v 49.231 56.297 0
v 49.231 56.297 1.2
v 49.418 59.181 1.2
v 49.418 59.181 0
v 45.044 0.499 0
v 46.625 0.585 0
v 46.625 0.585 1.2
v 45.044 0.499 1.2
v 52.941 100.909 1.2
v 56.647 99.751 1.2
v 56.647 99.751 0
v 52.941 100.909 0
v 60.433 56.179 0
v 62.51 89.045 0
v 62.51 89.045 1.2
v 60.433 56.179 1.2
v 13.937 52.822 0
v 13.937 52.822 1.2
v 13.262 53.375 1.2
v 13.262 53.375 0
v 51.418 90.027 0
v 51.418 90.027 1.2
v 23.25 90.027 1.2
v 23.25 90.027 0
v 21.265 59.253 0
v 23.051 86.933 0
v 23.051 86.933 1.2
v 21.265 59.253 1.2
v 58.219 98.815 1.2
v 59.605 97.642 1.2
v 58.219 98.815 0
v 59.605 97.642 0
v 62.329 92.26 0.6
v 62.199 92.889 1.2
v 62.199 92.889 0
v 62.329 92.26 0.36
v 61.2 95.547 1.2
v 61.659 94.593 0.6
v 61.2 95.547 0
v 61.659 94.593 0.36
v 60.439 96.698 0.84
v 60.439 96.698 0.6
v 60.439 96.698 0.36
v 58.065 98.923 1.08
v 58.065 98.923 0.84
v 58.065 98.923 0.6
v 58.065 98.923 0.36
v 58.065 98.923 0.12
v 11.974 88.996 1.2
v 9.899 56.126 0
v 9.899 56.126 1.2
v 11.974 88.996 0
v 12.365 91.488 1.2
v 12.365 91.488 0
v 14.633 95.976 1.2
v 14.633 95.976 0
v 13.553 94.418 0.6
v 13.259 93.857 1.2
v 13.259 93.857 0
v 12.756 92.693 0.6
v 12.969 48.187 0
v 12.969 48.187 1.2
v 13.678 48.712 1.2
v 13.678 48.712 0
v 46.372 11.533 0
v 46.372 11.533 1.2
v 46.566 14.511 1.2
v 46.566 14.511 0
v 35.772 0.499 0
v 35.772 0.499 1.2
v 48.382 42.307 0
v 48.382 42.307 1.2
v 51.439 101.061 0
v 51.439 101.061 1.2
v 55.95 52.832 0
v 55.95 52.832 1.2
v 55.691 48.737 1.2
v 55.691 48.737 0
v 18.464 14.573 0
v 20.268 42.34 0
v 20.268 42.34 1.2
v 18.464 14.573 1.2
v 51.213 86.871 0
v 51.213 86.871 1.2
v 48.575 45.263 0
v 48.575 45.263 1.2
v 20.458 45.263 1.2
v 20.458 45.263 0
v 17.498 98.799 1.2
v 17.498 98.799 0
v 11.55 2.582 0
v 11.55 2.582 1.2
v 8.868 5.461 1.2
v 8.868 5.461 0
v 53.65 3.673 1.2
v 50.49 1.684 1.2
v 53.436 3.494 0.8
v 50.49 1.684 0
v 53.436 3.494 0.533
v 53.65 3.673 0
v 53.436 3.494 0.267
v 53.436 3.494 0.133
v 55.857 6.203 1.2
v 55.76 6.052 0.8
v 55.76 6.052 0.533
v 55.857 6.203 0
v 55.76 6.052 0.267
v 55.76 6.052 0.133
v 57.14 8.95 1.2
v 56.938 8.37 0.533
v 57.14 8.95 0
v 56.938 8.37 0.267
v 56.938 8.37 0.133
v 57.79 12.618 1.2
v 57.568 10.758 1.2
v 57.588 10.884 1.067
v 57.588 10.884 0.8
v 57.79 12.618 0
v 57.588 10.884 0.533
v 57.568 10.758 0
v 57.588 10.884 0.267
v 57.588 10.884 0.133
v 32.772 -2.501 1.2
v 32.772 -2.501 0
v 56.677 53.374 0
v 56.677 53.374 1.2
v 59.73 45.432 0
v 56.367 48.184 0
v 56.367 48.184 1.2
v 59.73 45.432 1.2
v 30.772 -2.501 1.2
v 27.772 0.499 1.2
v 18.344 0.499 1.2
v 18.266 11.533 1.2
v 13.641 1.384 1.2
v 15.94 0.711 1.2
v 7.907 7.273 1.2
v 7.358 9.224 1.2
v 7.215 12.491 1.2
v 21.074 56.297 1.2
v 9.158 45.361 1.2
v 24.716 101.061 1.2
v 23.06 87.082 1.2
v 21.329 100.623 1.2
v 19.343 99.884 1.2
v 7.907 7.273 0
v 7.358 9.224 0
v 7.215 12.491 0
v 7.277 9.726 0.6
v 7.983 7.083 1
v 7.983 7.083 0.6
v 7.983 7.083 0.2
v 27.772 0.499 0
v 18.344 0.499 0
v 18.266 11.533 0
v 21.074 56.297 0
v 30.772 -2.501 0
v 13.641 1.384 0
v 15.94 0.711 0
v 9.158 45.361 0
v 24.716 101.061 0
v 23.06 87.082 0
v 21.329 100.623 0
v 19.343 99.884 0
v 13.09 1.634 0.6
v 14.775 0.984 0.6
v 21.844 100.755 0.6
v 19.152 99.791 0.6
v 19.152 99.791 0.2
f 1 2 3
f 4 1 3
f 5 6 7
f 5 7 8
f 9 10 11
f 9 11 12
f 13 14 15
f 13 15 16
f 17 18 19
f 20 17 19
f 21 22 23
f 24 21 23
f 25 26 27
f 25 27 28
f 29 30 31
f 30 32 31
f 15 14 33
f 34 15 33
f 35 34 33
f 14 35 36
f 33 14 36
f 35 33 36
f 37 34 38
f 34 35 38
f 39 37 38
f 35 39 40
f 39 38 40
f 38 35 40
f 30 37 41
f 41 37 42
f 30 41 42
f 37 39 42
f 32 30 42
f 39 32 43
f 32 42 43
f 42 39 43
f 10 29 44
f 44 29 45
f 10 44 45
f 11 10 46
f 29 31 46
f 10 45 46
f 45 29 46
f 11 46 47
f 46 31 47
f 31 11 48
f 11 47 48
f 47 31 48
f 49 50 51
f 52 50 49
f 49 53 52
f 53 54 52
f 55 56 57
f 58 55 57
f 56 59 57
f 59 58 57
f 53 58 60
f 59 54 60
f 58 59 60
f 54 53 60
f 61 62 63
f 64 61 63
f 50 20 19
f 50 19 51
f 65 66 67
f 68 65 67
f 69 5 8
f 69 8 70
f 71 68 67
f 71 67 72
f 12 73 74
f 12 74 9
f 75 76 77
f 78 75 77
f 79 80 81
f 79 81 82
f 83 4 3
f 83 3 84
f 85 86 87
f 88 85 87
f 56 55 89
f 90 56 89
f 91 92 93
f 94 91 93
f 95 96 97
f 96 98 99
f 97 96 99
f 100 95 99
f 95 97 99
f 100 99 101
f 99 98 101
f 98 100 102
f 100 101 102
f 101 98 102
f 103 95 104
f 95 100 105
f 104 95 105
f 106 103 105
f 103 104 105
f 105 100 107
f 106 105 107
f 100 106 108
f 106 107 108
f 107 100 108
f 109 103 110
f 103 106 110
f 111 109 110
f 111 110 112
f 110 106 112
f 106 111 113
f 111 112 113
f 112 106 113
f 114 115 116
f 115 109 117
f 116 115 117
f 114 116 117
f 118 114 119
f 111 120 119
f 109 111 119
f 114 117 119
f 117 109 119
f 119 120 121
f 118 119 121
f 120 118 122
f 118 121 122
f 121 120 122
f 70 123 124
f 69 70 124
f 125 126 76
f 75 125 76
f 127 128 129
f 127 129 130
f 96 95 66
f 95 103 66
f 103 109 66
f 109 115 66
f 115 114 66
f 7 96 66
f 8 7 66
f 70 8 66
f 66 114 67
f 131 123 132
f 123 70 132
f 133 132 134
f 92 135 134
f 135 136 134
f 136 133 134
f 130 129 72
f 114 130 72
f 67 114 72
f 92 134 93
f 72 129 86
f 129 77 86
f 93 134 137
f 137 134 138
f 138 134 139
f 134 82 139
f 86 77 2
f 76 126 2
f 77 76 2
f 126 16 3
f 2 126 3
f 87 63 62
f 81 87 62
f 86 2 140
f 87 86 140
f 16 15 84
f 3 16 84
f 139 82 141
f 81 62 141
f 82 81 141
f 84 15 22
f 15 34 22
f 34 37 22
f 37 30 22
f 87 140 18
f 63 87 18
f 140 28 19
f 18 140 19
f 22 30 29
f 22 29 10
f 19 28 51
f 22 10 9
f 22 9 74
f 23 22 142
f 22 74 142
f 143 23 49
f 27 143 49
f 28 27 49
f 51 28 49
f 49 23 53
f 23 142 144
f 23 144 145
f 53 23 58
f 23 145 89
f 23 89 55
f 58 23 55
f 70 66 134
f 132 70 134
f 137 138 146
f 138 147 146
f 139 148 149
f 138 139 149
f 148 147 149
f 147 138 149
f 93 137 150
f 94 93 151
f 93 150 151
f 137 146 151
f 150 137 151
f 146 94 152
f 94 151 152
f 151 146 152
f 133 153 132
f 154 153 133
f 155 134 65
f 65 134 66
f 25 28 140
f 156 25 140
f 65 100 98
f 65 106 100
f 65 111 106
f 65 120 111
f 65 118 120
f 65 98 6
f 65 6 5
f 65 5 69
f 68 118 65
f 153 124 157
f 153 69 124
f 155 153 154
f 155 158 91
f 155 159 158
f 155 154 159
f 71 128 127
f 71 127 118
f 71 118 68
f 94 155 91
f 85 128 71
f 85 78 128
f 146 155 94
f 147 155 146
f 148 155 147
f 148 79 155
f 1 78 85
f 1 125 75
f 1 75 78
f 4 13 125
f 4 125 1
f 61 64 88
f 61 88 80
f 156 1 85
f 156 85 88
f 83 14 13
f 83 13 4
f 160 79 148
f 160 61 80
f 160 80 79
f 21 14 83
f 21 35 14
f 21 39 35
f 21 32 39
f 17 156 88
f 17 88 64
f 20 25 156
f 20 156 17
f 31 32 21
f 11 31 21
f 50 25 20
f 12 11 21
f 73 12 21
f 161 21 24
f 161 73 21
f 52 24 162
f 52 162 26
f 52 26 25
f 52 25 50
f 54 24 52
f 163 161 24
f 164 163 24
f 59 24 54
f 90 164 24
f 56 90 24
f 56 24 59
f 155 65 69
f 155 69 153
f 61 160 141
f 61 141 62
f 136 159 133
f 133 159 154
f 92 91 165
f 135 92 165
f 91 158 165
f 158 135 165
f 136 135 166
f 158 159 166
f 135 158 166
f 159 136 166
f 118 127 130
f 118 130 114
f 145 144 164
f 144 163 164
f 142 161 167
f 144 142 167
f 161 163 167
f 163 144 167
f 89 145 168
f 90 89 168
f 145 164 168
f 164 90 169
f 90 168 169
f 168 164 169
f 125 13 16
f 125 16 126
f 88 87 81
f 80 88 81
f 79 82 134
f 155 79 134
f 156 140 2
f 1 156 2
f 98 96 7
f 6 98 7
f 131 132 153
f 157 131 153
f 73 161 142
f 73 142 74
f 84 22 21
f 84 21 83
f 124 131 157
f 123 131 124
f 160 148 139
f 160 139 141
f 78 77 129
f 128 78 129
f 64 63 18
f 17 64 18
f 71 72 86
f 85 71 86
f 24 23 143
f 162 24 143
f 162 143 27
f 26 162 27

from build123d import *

# Parameters (mm, degrees)
EXTRUDE_1_DEPTH     = 1.2
EXTRUDE_1_2_DEPTH   = 1.2
EXTRUDE_1_3_DEPTH   = 1.2
EXTRUDE_1_4_DEPTH   = 1.2
EXTRUDE_1_5_DEPTH   = 1.2
EXTRUDE_1_6_DEPTH   = 1.2
EXTRUDE_1_7_DEPTH   = 1.2
CUT_EXTRUDE_START   = -1.2
CUT_EXTRUDE_1_DEPTH = 1.2
EXTRUDE_2_DEPTH     = 1.2
SKETCH_4_W          = 8
SKETCH_4_H          = 3
EXTRUDE_3_DEPTH     = 1.2
CHAMFER_1_SIZE      = 3


# Read off the part's stored shape, not the designer's step: Вырез-Вытянуть-Тонкостенный1
with BuildPart() as part:
    # Эскиз1 → Бобышка-Вытянуть1 (new body)
    with BuildSketch(Plane.XY):
        with BuildLine():
            Line((48.715381083, 89.326618208), (25.633974438, 89.326618208))
            Line((25.633974438, 89.326618208), (16.424726332, 98.90501339))
            add(Edge.make_bspline(
                [(16.424726332, 98.90501339), (17.046442876, 99.341649928), (18.267344562, 100.199099019), (20.315095034, 101.097084096), (22.468240975, 101.668181371), (23.953020919, 101.729925319), (24.701392351, 101.76104603)],
                knots=[0, 0, 0, 0, 1.020658978, 2.004328627, 2.994124718, 4, 4, 4, 4], degree=3))
            Line((24.701392351, 101.76104603), (51.474269756, 101.76104603))
            Line((51.474269756, 101.76104603), (53.96115532, 101.508471715))
            Line((53.96115532, 101.508471715), (48.715381083, 89.326618208))
        make_face()
    extrude(amount=EXTRUDE_1_DEPTH)


with BuildPart() as body_2:
    # Эскиз1 → Extrude 1 2 (new body)
    with BuildSketch(Plane.XY):
        with BuildLine():
            Line((50.522258876, 87.034020578), (56.292610537, 100.711891183))
            add(Edge.make_bspline(
                [(56.292610537, 100.711891183), (56.872426459, 100.424489235), (57.992774107, 99.869157649), (59.468715814, 98.779028645), (60.7115741, 97.54513856), (61.719561272, 96.151707655), (62.467267736, 94.583389711), (62.961857151, 92.863872855), (63.249109501, 90.9875998), (63.222892422, 89.690287211), (63.209261013, 89.015757512)],
                knots=[0, 0, 0, 0, 1.065948377, 2.059675685, 3.011626956, 3.94566096, 4.882319089, 5.862745984, 6.888747923, 8, 8, 8, 8], degree=3))
            Line((63.209261013, 89.015757512), (61.110951318, 55.811949469))
            Line((61.110951318, 55.811949469), (56.661757613, 52.489625785))
            Line((56.661757613, 52.489625785), (48.695952289, 58.862270044))
            Line((48.695952289, 58.862270044), (50.522258876, 87.034020578))
        make_face()
    extrude(amount=EXTRUDE_1_2_DEPTH)


with BuildPart() as body_3:
    # Эскиз1 → Extrude 1 3 (new body)
    with BuildSketch(Plane.XY):
        with BuildLine():
            Line((47.705083822, 42.678085082), (56.389754504, 49.070158134))
            Line((56.389754504, 49.070158134), (60.45037234, 45.74783445))
            Line((60.45037234, 45.74783445), (58.488064199, 12.5634552))
            add(Edge.make_bspline(
                [(58.488064199, 12.5634552), (58.420496696, 11.874587816), (58.28970777, 10.541162419), (57.823949094, 8.625296868), (57.098173468, 6.888651889), (56.155918884, 5.305629758), (54.972806214, 3.892910011), (53.56092009, 2.640506095), (51.90764089, 1.560277715), (50.685929609, 1.000522637), (50.055967832, 0.711891183)],
                knots=[0, 0, 0, 0, 1.076355317, 2.083477241, 3.054916997, 3.995219207, 4.939832775, 5.910749548, 6.922701339, 8, 8, 8, 8], degree=3))
            Line((50.055967832, 0.711891183), (45.859348442, 14.428619374))
            Line((45.859348442, 14.428619374), (47.705083822, 42.678085082))
        make_face()
    extrude(amount=EXTRUDE_1_3_DEPTH)


with BuildPart() as body_4:
    # Эскиз1 → Extrude 1 4 (new body)
    with BuildSketch(Plane.XY):
        with BuildLine():
            Line((20.815633657, 12.233165711), (43.877611508, 12.233165711))
            Line((43.877611508, 12.233165711), (47.549653474, -0.065260556))
            Line((47.549653474, -0.065260556), (45.06276791, -0.201262111))
            Line((45.06276791, -0.201262111), (18.328748093, -0.201262111))
            add(Edge.make_bspline(
                [(18.328748093, -0.201262111), (17.587342725, -0.16790088), (16.138327284, -0.102699115), (14.051390965, 0.415320239), (12.125296995, 1.268374835), (11.016129357, 2.10124066), (10.460086737, 2.518768975)],
                knots=[0, 0, 0, 0, 1.046522757, 2.045342129, 3.020100256, 4, 4, 4, 4], degree=3))
            Line((10.460086737, 2.518768975), (20.815633657, 12.233165711))
        make_face()
    extrude(amount=EXTRUDE_1_4_DEPTH)


with BuildPart() as body_5:
    # Эскиз1 → Extrude 1 5 (new body)
    with BuildSketch(Plane.XY):
        with BuildLine():
            Line((19.144757418, 14.253760232), (8.750352911, 4.383933149))
            add(Edge.make_bspline(
                [(8.750352911, 4.383933149), (8.347830199, 4.971791124), (7.548998065, 6.138432973), (6.823323675, 8.155816029), (6.434028016, 10.301026142), (6.488276416, 11.771820349), (6.516041662, 12.524597613)],
                knots=[0, 0, 0, 0, 0.987067533, 1.958898816, 2.955330013, 4, 4, 4, 4], degree=3))
            Line((6.516041662, 12.524597613), (8.478349802, 45.728405657))
            Line((8.478349802, 45.728405657), (12.985829888, 49.070158134))
            Line((12.985829888, 49.070158134), (20.990492798, 42.658656288))
            Line((20.990492798, 42.658656288), (19.144757418, 14.253760232))
        make_face()
    extrude(amount=EXTRUDE_1_5_DEPTH)


with BuildPart() as body_6:
    # Эскиз1 → Extrude 1 6 (new body)
    with BuildSketch(Plane.XY):
        with BuildLine():
            Line((21.942503678, 58.881698837), (13.238404203, 52.489625785))
            Line((13.238404203, 52.489625785), (9.177786367, 55.811949469))
            Line((9.177786367, 55.811949469), (11.276096062, 89.054615099))
            add(Edge.make_bspline(
                [(11.276096062, 89.054615099), (11.352568907, 89.792004626), (11.503633208, 91.248642381), (12.205959169, 93.332866685), (13.177672166, 95.318642991), (14.120219983, 96.460520121), (14.598419746, 97.039849216)],
                knots=[0, 0, 0, 0, 1.007070456, 1.989364909, 2.979908279, 4, 4, 4, 4], degree=3))
            Line((14.598419746, 97.039849216), (23.768810265, 87.189450926))
            Line((23.768810265, 87.189450926), (21.942503678, 58.881698837))
        make_face()
    extrude(amount=EXTRUDE_1_6_DEPTH)


with BuildPart() as body_7:
    # Эскиз1 → Extrude 1 7 (new body)
    with BuildSketch(Plane.XY):
        Polygon((14.948138029, 50.77989196), (23.613379917, 56.997105871), (46.811359323, 56.997105871), (54.680020679, 50.77989196), (46.034207584, 44.562678049), (22.816799385, 44.562678049), align=None)
    extrude(amount=EXTRUDE_1_7_DEPTH)


with BuildPart() as cut_extrude_1_tool:
    # Вырез-Вытянуть-Тонкостенный1 outline → Вырез-Вытянуть-Тонкостенный1 (new body)
    # profile 1 of 7: a face of its own
    with BuildSketch(Plane.XY.offset(1.2).offset(CUT_EXTRUDE_START)):
        with BuildLine():
            add(Edge.make_bspline(
                [(16.424726332, 98.90501339), (17.046442876, 99.341649928), (18.267344562, 100.199099019), (20.315095034, 101.097084096), (22.468240975, 101.668181371), (23.953020919, 101.729925319), (24.701392351, 101.76104603)],
                knots=[0, 0, 0, 0, 0.255164744, 0.501082157, 0.74853118, 1, 1, 1, 1], degree=3))
            Line((16.424726332, 98.90501339), (25.633974438, 89.326618208))
            Line((25.633974438, 89.326618208), (48.715381083, 89.326618208))
            Line((48.715381083, 89.326618208), (53.96115532, 101.508471715))
            Line((53.96115532, 101.508471715), (51.474269756, 101.76104603))
            Line((51.474269756, 101.76104603), (24.701392351, 101.76104603))
        make_face()
        with BuildLine():
            add(Edge.make_bspline(
                [(24.715941202, 101.06104603), (24.073440985, 101.034324979), (23.430886148, 101.008238304), (22.474393504, 100.88386239), (22.156175981, 100.826220075), (21.532137699, 100.683185135), (21.225013046, 100.59813608), (20.315786313, 100.309405985), (19.724576172, 100.075612456), (18.865147168, 99.649208655), (18.582909623, 99.492741509), (18.032739645, 99.157865771), (17.763926458, 98.980519597), (17.497832435, 98.79887764)],
                knots=[0, 0, 0, 0, 0.25, 0.25, 0.375, 0.375, 0.5, 0.5, 0.75, 0.75, 0.875, 0.875, 1, 1, 1, 1], degree=3))
            Line((24.715941202, 101.06104603), (51.438814077, 101.06104603))
            Line((51.438814077, 101.06104603), (52.940656917, 100.908515117))
            Line((52.940656917, 100.908515117), (48.254672603, 90.026618208))
            Line((48.254672603, 90.026618208), (25.932012903, 90.026618208))
            Line((25.932012903, 90.026618208), (17.497832435, 98.79887764))
        make_face(mode=Mode.SUBTRACT)
    # profile 2 of 7: a face of its own
    with BuildSketch(Plane.XY.offset(1.2).offset(CUT_EXTRUDE_START)):
        with BuildLine():
            add(Edge.make_bspline(
                [(58.488064199, 12.5634552), (58.420496696, 11.874587816), (58.28970777, 10.541162419), (57.823949094, 8.625296868), (57.098173468, 6.888651889), (56.155918884, 5.305629758), (54.972806214, 3.892910011), (53.56092009, 2.640506095), (51.90764089, 1.560277715), (50.685929609, 1.000522637), (50.055967832, 0.711891183)],
                knots=[0, 0, 0, 0, 0.134544415, 0.260434655, 0.381864625, 0.499402401, 0.617479097, 0.738843694, 0.865337667, 1, 1, 1, 1], degree=3))
            Line((58.488064199, 12.5634552), (60.45037234, 45.74783445))
            Line((60.45037234, 45.74783445), (56.389754504, 49.070158134))
            Line((56.389754504, 49.070158134), (47.705083822, 42.678085082))
            Line((47.705083822, 42.678085082), (45.859348442, 14.428619374))
            Line((45.859348442, 14.428619374), (50.055967832, 0.711891183))
        make_face()
        with BuildLine():
            add(Edge.make_bspline(
                [(50.490477038, 1.684339901), (51.016803061, 1.932934245), (51.533598279, 2.195809917), (52.51798996, 2.795282573), (52.988546029, 3.127444771), (53.883987055, 3.860204526), (54.311901532, 4.26460134), (55.090762842, 5.120051505), (55.44412253, 5.572957078), (56.074950898, 6.531746368), (56.354011587, 7.036518731), (56.722187981, 7.828870826), (56.835838323, 8.098504952), (57.041125652, 8.641174625), (57.133136752, 8.915309199), (57.377976964, 9.745926597), (57.500043582, 10.310509714), (57.676250384, 11.457562148), (57.733227854, 12.03865129), (57.79008471, 12.6183025)],
                knots=[0, 0, 0, 0, 0.125, 0.125, 0.25, 0.25, 0.375, 0.375, 0.5, 0.5, 0.625, 0.625, 0.6875, 0.6875, 0.75, 0.75, 0.875, 0.875, 1, 1, 1, 1], degree=3))
            Line((50.490477038, 1.684339901), (46.566214612, 14.510864312))
            Line((46.566214612, 14.510864312), (48.382357411, 42.307407778))
            Line((48.382357411, 42.307407778), (56.367054799, 48.184287958))
            Line((56.367054799, 48.184287958), (59.73049572, 45.43238175))
            Line((59.73049572, 45.43238175), (57.79008471, 12.6183025))
        make_face(mode=Mode.SUBTRACT)
    # profile 3 of 7: a face of its own
    with BuildSketch(Plane.XY.offset(1.2).offset(CUT_EXTRUDE_START)):
        with BuildLine():
            add(Edge.make_bspline(
                [(18.328748093, -0.201262111), (17.587342725, -0.16790088), (16.138327284, -0.102699115), (14.051390965, 0.415320239), (12.125296995, 1.268374835), (11.016129357, 2.10124066), (10.460086737, 2.518768975)],
                knots=[0, 0, 0, 0, 0.261630689, 0.511335532, 0.755025064, 1, 1, 1, 1], degree=3))
            Line((18.328748093, -0.201262111), (45.06276791, -0.201262111))
            Line((45.06276791, -0.201262111), (47.549653474, -0.065260556))
            Line((47.549653474, -0.065260556), (43.877611508, 12.233165711))
            Line((43.877611508, 12.233165711), (20.815633657, 12.233165711))
            Line((20.815633657, 12.233165711), (10.460086737, 2.518768975))
        make_face()
        with BuildLine():
            add(Edge.make_bspline(
                [(11.550470184, 2.5818496), (11.795867518, 2.404685246), (12.04441495, 2.232941282), (12.55541981, 1.913388359), (12.818645158, 1.766900763), (13.360505008, 1.500440183), (13.639861318, 1.37962177), (14.203014591, 1.163782269), (14.487530387, 1.067995459), (15.349461212, 0.815242091), (15.935710043, 0.694741726), (17.132291051, 0.553157757), (17.739582498, 0.525960144), (18.34448977, 0.498737889)],
                knots=[0, 0, 0, 0, 0.125, 0.125, 0.25, 0.25, 0.375, 0.375, 0.5, 0.5, 0.75, 0.75, 1, 1, 1, 1], degree=3))
            Line((11.550470184, 2.5818496), (21.092573159, 11.533165711))
            Line((21.092573159, 11.533165711), (43.356080156, 11.533165711))
            Line((43.356080156, 11.533165711), (46.624900169, 0.585212969))
            Line((46.624900169, 0.585212969), (45.043641575, 0.498737889))
            Line((45.043641575, 0.498737889), (18.34448977, 0.498737889))
        make_face(mode=Mode.SUBTRACT)
    # profile 4 of 7: a face of its own
    with BuildSketch(Plane.XY.offset(1.2).offset(CUT_EXTRUDE_START)):
        with BuildLine():
            add(Edge.make_bspline(
                [(8.750352911, 4.383933149), (8.347830199, 4.971791124), (7.548998065, 6.138432973), (6.823323675, 8.155816029), (6.434028016, 10.301026142), (6.488276416, 11.771820349), (6.516041662, 12.524597613)],
                knots=[0, 0, 0, 0, 0.246766883, 0.489724704, 0.738832503, 1, 1, 1, 1], degree=3))
            Line((8.750352911, 4.383933149), (19.144757418, 14.253760232))
            Line((19.144757418, 14.253760232), (20.990492798, 42.658656288))
            Line((20.990492798, 42.658656288), (12.985829888, 49.070158134))
            Line((12.985829888, 49.070158134), (8.478349802, 45.728405657))
            Line((8.478349802, 45.728405657), (6.516041662, 12.524597613))
        make_face()
        with BuildLine():
            add(Edge.make_bspline(
                [(7.215280083, 12.491044523), (7.192593087, 11.875928134), (7.169240469, 11.260808285), (7.208484477, 10.338514623), (7.235652525, 10.030169922), (7.318423295, 9.422710186), (7.373272427, 9.122636757), (7.572996989, 8.231969766), (7.747788139, 7.649500612), (8.100031678, 6.800254206), (8.234732821, 6.520587684), (8.534633236, 5.98098186), (8.698262824, 5.719148815), (8.86783246, 5.460776557)],
                knots=[0, 0, 0, 0, 0.25, 0.25, 0.375, 0.375, 0.5, 0.5, 0.75, 0.75, 0.875, 0.875, 1, 1, 1, 1], degree=3))
            Line((7.215280083, 12.491044523), (9.157844696, 45.360776429))
            Line((9.157844696, 45.360776429), (12.969316506, 48.186522772))
            Line((12.969316506, 48.186522772), (20.268325319, 42.340229305))
            Line((20.268325319, 42.340229305), (18.464002717, 14.572654109))
            Line((18.464002717, 14.572654109), (8.86783246, 5.460776557))
        make_face(mode=Mode.SUBTRACT)
    # profile 5 of 7: a face of its own
    with BuildSketch(Plane.XY.offset(1.2).offset(CUT_EXTRUDE_START)):
        with BuildLine():
            add(Edge.make_bspline(
                [(56.292610537, 100.711891183), (56.872426459, 100.424489235), (57.992774107, 99.869157649), (59.468715814, 98.779028645), (60.7115741, 97.54513856), (61.719561272, 96.151707655), (62.467267736, 94.583389711), (62.961857151, 92.863872855), (63.249109501, 90.9875998), (63.222892422, 89.690287211), (63.209261013, 89.015757512)],
                knots=[0, 0, 0, 0, 0.133243547, 0.257459461, 0.376453369, 0.49320762, 0.610289886, 0.732843248, 0.86109349, 1, 1, 1, 1], degree=3))
            Line((56.292610537, 100.711891183), (50.522258876, 87.034020578))
            Line((50.522258876, 87.034020578), (48.695952289, 58.862270044))
            Line((48.695952289, 58.862270044), (56.661757613, 52.489625785))
            Line((56.661757613, 52.489625785), (61.110951318, 55.811949469))
            Line((61.110951318, 55.811949469), (63.209261013, 89.015757512))
        make_face()
        with BuildLine():
            add(Edge.make_bspline(
                [(62.509707325, 89.044916143), (62.520655005, 89.586777516), (62.531614092, 90.128640554), (62.486925974, 91.202640138), (62.425532622, 91.733937577), (62.233275726, 92.786387746), (62.106497215, 93.308137014), (61.857452254, 94.0821631), (61.76367931, 94.339939524), (61.554525349, 94.845784711), (61.439952755, 95.092551689), (61.065159761, 95.813715522), (60.772410336, 96.268079972), (60.10629843, 97.127164795), (59.731552001, 97.532731648), (58.936371123, 98.273695822), (58.514205064, 98.614488539), (57.840773045, 99.07713333), (57.608626021, 99.22292192), (57.133319735, 99.497043126), (56.891187647, 99.625934561), (56.647043471, 99.75115614)],
                knots=[0, 0, 0, 0, 0.125, 0.125, 0.25, 0.25, 0.375, 0.375, 0.4375, 0.4375, 0.5, 0.5, 0.625, 0.625, 0.75, 0.75, 0.875, 0.875, 0.9375, 0.9375, 1, 1, 1, 1], degree=3))
            Line((62.509707325, 89.044916143), (60.432760377, 56.179153792))
            Line((60.432760377, 56.179153792), (56.676505558, 53.374264822))
            Line((56.676505558, 53.374264822), (49.418084276, 59.181001848))
            Line((49.418084276, 59.181001848), (51.213147748, 86.870810722))
            Line((51.213147748, 86.870810722), (56.647043471, 99.75115614))
        make_face(mode=Mode.SUBTRACT)
    # profile 6 of 7: a face of its own
    with BuildSketch(Plane.XY.offset(1.2).offset(CUT_EXTRUDE_START)):
        with BuildLine():
            add(Edge.make_bspline(
                [(11.276096062, 89.054615099), (11.352568907, 89.792004626), (11.503633208, 91.248642381), (12.205959169, 93.332866685), (13.177672166, 95.318642991), (14.120219983, 96.460520121), (14.598419746, 97.039849216)],
                knots=[0, 0, 0, 0, 0.251767614, 0.497341227, 0.74497707, 1, 1, 1, 1], degree=3))
            Line((11.276096062, 89.054615099), (9.177786367, 55.811949469))
            Line((9.177786367, 55.811949469), (13.238404203, 52.489625785))
            Line((13.238404203, 52.489625785), (21.942503678, 58.881698837))
            Line((21.942503678, 58.881698837), (23.768810265, 87.189450926))
            Line((23.768810265, 87.189450926), (14.598419746, 97.039849216))
        make_face()
        with BuildLine():
            add(Edge.make_bspline(
                [(14.632841243, 95.975566267), (14.434797367, 95.728005104), (14.241625925, 95.477226659), (13.877903829, 94.960733196), (13.708791385, 94.694068524), (13.398026362, 94.142607351), (13.255091928, 93.858038457), (12.991155221, 93.281622928), (12.869195506, 92.989330109), (12.530104488, 92.101518005), (12.343911454, 91.491441144), (12.103625715, 90.253812557), (12.03901401, 89.62507322), (11.973817002, 88.996438494)],
                knots=[0, 0, 0, 0, 0.125, 0.125, 0.25, 0.25, 0.375, 0.375, 0.5, 0.5, 0.75, 0.75, 1, 1, 1, 1], degree=3))
            Line((14.632841243, 95.975566267), (23.05083291, 86.933359116))
            Line((23.05083291, 86.933359116), (21.264978981, 59.252623217))
            Line((21.264978981, 59.252623217), (13.261566694, 53.375117319))
            Line((13.261566694, 53.375117319), (9.899021021, 56.126291051))
            Line((9.899021021, 56.126291051), (11.973817002, 88.996438494))
        make_face(mode=Mode.SUBTRACT)
    # profile 7 of 7: a face of its own
    with BuildSketch(Plane.XY.offset(1.2).offset(CUT_EXTRUDE_START)):
        Polygon((23.613379917, 56.997105871), (14.948138029, 50.77989196), (22.816799385, 44.562678049), (46.034207584, 44.562678049), (54.680020679, 50.77989196), (46.811359323, 56.997105871), align=None)
        Polygon((16.111349946, 50.752945787), (23.838523063, 56.297105871), (46.568188655, 56.297105871), (53.517615169, 50.806200971), (45.808653605, 45.262678049), (23.059970052, 45.262678049), align=None, mode=Mode.SUBTRACT)
    extrude(amount=CUT_EXTRUDE_1_DEPTH)


with BuildPart() as part_1:
    add(part.part)

    # Вырез-Вытянуть-Тонкостенный1: cut by cut_extrude_1_tool
    add(cut_extrude_1_tool.part, mode=Mode.SUBTRACT)



with BuildPart() as body_2_1:
    add(body_2.part)

    # Вырез-Вытянуть-Тонкостенный1: cut by cut_extrude_1_tool
    add(cut_extrude_1_tool.part, mode=Mode.SUBTRACT)


with BuildPart() as body_3_1:
    add(body_3.part)

    # Вырез-Вытянуть-Тонкостенный1: cut by cut_extrude_1_tool
    add(cut_extrude_1_tool.part, mode=Mode.SUBTRACT)


with BuildPart() as body_4_1:
    add(body_4.part)

    # Вырез-Вытянуть-Тонкостенный1: cut by cut_extrude_1_tool
    add(cut_extrude_1_tool.part, mode=Mode.SUBTRACT)


with BuildPart() as body_5_1:
    add(body_5.part)

    # Вырез-Вытянуть-Тонкостенный1: cut by cut_extrude_1_tool
    add(cut_extrude_1_tool.part, mode=Mode.SUBTRACT)


with BuildPart() as body_6_1:
    add(body_6.part)

    # Вырез-Вытянуть-Тонкостенный1: cut by cut_extrude_1_tool
    add(cut_extrude_1_tool.part, mode=Mode.SUBTRACT)


with BuildPart() as body_7_1:
    add(body_7.part)

    # Вырез-Вытянуть-Тонкостенный1: cut by cut_extrude_1_tool
    add(cut_extrude_1_tool.part, mode=Mode.SUBTRACT)


with BuildPart() as part_2:
    add(part_1.part)

    add(body_2_1.part)  # Бобышка-Вытянуть2 merges body 2

    add(body_3_1.part)  # Бобышка-Вытянуть2 merges body 3

    add(body_4_1.part)  # Бобышка-Вытянуть2 merges body 4

    add(body_5_1.part)  # Бобышка-Вытянуть2 merges body 5

    add(body_6_1.part)  # Бобышка-Вытянуть2 merges body 6

    add(body_7_1.part)  # Бобышка-Вытянуть2 merges body 7
    # Эскиз3 → Бобышка-Вытянуть2 (add)
    with BuildSketch(Plane.XY.offset(1.2)):
        Polygon((23.250398012, 90.026618208), (23.06040377, 87.081707459), (23.05083291, 86.933359116), (14.632841243, 95.975566267), (17.497832435, 98.79887764), (25.932012903, 90.026618208), align=None)
        Polygon((48.254672603, 90.026618208), (51.41773113, 90.026618208), (51.213147748, 86.870810722), (56.647043471, 99.75115614), (52.940656917, 100.908515117), align=None)
        Polygon((13.677938559, 48.7118805), (13.937384418, 52.822175544), (13.261566694, 53.375117319), (21.264978981, 59.252623217), (21.074300442, 56.297105871), (23.838523063, 56.297105871), (16.111349946, 50.752945787), (23.059970052, 45.262678049), (20.458224519, 45.262678049), (20.268325319, 42.340229305), (12.969316506, 48.186522772), align=None)
        Polygon((8.86783246, 5.460776557), (18.464002717, 14.572654109), (18.266498341, 11.533165711), (21.092573159, 11.533165711), (11.550470184, 2.5818496), align=None)
        Polygon((46.566214612, 14.510864312), (50.490477038, 1.684339901), (46.624900169, 0.585212969), (43.356080156, 11.533165711), (46.371660715, 11.533165711), align=None)
        Polygon((49.418084276, 59.181001848), (56.676505558, 53.374264822), (55.950218762, 52.831928394), (55.691444183, 48.73706028), (56.367054799, 48.184287958), (48.382357411, 42.307407778), (48.575445909, 45.262678049), (45.808653605, 45.262678049), (53.517615169, 50.806200971), (46.568188655, 56.297105871), (49.231128261, 56.297105871), align=None)
    extrude(amount=-EXTRUDE_2_DEPTH)

    # Эскиз4 → Бобышка-Вытянуть3 (add)
    with BuildSketch(Plane.XY.offset(1.2)):
        with Locations((31.771660715, -1.001262111)):
            Rectangle(SKETCH_4_W, SKETCH_4_H)
    extrude(amount=-EXTRUDE_3_DEPTH)

    # Фаска1
    chamfer_1_edges = [part_2.edges().sort_by_distance(p)[0] for p in [
        (35.771660715, -2.501262111, 0.6),
        (27.771660715, -2.501262111, 0.6),
    ]]
    chamfer(chamfer_1_edges, length=CHAMFER_1_SIZE - 0.0001)  # a hair under: the kernel refuses the full size


solid = part_2.part
